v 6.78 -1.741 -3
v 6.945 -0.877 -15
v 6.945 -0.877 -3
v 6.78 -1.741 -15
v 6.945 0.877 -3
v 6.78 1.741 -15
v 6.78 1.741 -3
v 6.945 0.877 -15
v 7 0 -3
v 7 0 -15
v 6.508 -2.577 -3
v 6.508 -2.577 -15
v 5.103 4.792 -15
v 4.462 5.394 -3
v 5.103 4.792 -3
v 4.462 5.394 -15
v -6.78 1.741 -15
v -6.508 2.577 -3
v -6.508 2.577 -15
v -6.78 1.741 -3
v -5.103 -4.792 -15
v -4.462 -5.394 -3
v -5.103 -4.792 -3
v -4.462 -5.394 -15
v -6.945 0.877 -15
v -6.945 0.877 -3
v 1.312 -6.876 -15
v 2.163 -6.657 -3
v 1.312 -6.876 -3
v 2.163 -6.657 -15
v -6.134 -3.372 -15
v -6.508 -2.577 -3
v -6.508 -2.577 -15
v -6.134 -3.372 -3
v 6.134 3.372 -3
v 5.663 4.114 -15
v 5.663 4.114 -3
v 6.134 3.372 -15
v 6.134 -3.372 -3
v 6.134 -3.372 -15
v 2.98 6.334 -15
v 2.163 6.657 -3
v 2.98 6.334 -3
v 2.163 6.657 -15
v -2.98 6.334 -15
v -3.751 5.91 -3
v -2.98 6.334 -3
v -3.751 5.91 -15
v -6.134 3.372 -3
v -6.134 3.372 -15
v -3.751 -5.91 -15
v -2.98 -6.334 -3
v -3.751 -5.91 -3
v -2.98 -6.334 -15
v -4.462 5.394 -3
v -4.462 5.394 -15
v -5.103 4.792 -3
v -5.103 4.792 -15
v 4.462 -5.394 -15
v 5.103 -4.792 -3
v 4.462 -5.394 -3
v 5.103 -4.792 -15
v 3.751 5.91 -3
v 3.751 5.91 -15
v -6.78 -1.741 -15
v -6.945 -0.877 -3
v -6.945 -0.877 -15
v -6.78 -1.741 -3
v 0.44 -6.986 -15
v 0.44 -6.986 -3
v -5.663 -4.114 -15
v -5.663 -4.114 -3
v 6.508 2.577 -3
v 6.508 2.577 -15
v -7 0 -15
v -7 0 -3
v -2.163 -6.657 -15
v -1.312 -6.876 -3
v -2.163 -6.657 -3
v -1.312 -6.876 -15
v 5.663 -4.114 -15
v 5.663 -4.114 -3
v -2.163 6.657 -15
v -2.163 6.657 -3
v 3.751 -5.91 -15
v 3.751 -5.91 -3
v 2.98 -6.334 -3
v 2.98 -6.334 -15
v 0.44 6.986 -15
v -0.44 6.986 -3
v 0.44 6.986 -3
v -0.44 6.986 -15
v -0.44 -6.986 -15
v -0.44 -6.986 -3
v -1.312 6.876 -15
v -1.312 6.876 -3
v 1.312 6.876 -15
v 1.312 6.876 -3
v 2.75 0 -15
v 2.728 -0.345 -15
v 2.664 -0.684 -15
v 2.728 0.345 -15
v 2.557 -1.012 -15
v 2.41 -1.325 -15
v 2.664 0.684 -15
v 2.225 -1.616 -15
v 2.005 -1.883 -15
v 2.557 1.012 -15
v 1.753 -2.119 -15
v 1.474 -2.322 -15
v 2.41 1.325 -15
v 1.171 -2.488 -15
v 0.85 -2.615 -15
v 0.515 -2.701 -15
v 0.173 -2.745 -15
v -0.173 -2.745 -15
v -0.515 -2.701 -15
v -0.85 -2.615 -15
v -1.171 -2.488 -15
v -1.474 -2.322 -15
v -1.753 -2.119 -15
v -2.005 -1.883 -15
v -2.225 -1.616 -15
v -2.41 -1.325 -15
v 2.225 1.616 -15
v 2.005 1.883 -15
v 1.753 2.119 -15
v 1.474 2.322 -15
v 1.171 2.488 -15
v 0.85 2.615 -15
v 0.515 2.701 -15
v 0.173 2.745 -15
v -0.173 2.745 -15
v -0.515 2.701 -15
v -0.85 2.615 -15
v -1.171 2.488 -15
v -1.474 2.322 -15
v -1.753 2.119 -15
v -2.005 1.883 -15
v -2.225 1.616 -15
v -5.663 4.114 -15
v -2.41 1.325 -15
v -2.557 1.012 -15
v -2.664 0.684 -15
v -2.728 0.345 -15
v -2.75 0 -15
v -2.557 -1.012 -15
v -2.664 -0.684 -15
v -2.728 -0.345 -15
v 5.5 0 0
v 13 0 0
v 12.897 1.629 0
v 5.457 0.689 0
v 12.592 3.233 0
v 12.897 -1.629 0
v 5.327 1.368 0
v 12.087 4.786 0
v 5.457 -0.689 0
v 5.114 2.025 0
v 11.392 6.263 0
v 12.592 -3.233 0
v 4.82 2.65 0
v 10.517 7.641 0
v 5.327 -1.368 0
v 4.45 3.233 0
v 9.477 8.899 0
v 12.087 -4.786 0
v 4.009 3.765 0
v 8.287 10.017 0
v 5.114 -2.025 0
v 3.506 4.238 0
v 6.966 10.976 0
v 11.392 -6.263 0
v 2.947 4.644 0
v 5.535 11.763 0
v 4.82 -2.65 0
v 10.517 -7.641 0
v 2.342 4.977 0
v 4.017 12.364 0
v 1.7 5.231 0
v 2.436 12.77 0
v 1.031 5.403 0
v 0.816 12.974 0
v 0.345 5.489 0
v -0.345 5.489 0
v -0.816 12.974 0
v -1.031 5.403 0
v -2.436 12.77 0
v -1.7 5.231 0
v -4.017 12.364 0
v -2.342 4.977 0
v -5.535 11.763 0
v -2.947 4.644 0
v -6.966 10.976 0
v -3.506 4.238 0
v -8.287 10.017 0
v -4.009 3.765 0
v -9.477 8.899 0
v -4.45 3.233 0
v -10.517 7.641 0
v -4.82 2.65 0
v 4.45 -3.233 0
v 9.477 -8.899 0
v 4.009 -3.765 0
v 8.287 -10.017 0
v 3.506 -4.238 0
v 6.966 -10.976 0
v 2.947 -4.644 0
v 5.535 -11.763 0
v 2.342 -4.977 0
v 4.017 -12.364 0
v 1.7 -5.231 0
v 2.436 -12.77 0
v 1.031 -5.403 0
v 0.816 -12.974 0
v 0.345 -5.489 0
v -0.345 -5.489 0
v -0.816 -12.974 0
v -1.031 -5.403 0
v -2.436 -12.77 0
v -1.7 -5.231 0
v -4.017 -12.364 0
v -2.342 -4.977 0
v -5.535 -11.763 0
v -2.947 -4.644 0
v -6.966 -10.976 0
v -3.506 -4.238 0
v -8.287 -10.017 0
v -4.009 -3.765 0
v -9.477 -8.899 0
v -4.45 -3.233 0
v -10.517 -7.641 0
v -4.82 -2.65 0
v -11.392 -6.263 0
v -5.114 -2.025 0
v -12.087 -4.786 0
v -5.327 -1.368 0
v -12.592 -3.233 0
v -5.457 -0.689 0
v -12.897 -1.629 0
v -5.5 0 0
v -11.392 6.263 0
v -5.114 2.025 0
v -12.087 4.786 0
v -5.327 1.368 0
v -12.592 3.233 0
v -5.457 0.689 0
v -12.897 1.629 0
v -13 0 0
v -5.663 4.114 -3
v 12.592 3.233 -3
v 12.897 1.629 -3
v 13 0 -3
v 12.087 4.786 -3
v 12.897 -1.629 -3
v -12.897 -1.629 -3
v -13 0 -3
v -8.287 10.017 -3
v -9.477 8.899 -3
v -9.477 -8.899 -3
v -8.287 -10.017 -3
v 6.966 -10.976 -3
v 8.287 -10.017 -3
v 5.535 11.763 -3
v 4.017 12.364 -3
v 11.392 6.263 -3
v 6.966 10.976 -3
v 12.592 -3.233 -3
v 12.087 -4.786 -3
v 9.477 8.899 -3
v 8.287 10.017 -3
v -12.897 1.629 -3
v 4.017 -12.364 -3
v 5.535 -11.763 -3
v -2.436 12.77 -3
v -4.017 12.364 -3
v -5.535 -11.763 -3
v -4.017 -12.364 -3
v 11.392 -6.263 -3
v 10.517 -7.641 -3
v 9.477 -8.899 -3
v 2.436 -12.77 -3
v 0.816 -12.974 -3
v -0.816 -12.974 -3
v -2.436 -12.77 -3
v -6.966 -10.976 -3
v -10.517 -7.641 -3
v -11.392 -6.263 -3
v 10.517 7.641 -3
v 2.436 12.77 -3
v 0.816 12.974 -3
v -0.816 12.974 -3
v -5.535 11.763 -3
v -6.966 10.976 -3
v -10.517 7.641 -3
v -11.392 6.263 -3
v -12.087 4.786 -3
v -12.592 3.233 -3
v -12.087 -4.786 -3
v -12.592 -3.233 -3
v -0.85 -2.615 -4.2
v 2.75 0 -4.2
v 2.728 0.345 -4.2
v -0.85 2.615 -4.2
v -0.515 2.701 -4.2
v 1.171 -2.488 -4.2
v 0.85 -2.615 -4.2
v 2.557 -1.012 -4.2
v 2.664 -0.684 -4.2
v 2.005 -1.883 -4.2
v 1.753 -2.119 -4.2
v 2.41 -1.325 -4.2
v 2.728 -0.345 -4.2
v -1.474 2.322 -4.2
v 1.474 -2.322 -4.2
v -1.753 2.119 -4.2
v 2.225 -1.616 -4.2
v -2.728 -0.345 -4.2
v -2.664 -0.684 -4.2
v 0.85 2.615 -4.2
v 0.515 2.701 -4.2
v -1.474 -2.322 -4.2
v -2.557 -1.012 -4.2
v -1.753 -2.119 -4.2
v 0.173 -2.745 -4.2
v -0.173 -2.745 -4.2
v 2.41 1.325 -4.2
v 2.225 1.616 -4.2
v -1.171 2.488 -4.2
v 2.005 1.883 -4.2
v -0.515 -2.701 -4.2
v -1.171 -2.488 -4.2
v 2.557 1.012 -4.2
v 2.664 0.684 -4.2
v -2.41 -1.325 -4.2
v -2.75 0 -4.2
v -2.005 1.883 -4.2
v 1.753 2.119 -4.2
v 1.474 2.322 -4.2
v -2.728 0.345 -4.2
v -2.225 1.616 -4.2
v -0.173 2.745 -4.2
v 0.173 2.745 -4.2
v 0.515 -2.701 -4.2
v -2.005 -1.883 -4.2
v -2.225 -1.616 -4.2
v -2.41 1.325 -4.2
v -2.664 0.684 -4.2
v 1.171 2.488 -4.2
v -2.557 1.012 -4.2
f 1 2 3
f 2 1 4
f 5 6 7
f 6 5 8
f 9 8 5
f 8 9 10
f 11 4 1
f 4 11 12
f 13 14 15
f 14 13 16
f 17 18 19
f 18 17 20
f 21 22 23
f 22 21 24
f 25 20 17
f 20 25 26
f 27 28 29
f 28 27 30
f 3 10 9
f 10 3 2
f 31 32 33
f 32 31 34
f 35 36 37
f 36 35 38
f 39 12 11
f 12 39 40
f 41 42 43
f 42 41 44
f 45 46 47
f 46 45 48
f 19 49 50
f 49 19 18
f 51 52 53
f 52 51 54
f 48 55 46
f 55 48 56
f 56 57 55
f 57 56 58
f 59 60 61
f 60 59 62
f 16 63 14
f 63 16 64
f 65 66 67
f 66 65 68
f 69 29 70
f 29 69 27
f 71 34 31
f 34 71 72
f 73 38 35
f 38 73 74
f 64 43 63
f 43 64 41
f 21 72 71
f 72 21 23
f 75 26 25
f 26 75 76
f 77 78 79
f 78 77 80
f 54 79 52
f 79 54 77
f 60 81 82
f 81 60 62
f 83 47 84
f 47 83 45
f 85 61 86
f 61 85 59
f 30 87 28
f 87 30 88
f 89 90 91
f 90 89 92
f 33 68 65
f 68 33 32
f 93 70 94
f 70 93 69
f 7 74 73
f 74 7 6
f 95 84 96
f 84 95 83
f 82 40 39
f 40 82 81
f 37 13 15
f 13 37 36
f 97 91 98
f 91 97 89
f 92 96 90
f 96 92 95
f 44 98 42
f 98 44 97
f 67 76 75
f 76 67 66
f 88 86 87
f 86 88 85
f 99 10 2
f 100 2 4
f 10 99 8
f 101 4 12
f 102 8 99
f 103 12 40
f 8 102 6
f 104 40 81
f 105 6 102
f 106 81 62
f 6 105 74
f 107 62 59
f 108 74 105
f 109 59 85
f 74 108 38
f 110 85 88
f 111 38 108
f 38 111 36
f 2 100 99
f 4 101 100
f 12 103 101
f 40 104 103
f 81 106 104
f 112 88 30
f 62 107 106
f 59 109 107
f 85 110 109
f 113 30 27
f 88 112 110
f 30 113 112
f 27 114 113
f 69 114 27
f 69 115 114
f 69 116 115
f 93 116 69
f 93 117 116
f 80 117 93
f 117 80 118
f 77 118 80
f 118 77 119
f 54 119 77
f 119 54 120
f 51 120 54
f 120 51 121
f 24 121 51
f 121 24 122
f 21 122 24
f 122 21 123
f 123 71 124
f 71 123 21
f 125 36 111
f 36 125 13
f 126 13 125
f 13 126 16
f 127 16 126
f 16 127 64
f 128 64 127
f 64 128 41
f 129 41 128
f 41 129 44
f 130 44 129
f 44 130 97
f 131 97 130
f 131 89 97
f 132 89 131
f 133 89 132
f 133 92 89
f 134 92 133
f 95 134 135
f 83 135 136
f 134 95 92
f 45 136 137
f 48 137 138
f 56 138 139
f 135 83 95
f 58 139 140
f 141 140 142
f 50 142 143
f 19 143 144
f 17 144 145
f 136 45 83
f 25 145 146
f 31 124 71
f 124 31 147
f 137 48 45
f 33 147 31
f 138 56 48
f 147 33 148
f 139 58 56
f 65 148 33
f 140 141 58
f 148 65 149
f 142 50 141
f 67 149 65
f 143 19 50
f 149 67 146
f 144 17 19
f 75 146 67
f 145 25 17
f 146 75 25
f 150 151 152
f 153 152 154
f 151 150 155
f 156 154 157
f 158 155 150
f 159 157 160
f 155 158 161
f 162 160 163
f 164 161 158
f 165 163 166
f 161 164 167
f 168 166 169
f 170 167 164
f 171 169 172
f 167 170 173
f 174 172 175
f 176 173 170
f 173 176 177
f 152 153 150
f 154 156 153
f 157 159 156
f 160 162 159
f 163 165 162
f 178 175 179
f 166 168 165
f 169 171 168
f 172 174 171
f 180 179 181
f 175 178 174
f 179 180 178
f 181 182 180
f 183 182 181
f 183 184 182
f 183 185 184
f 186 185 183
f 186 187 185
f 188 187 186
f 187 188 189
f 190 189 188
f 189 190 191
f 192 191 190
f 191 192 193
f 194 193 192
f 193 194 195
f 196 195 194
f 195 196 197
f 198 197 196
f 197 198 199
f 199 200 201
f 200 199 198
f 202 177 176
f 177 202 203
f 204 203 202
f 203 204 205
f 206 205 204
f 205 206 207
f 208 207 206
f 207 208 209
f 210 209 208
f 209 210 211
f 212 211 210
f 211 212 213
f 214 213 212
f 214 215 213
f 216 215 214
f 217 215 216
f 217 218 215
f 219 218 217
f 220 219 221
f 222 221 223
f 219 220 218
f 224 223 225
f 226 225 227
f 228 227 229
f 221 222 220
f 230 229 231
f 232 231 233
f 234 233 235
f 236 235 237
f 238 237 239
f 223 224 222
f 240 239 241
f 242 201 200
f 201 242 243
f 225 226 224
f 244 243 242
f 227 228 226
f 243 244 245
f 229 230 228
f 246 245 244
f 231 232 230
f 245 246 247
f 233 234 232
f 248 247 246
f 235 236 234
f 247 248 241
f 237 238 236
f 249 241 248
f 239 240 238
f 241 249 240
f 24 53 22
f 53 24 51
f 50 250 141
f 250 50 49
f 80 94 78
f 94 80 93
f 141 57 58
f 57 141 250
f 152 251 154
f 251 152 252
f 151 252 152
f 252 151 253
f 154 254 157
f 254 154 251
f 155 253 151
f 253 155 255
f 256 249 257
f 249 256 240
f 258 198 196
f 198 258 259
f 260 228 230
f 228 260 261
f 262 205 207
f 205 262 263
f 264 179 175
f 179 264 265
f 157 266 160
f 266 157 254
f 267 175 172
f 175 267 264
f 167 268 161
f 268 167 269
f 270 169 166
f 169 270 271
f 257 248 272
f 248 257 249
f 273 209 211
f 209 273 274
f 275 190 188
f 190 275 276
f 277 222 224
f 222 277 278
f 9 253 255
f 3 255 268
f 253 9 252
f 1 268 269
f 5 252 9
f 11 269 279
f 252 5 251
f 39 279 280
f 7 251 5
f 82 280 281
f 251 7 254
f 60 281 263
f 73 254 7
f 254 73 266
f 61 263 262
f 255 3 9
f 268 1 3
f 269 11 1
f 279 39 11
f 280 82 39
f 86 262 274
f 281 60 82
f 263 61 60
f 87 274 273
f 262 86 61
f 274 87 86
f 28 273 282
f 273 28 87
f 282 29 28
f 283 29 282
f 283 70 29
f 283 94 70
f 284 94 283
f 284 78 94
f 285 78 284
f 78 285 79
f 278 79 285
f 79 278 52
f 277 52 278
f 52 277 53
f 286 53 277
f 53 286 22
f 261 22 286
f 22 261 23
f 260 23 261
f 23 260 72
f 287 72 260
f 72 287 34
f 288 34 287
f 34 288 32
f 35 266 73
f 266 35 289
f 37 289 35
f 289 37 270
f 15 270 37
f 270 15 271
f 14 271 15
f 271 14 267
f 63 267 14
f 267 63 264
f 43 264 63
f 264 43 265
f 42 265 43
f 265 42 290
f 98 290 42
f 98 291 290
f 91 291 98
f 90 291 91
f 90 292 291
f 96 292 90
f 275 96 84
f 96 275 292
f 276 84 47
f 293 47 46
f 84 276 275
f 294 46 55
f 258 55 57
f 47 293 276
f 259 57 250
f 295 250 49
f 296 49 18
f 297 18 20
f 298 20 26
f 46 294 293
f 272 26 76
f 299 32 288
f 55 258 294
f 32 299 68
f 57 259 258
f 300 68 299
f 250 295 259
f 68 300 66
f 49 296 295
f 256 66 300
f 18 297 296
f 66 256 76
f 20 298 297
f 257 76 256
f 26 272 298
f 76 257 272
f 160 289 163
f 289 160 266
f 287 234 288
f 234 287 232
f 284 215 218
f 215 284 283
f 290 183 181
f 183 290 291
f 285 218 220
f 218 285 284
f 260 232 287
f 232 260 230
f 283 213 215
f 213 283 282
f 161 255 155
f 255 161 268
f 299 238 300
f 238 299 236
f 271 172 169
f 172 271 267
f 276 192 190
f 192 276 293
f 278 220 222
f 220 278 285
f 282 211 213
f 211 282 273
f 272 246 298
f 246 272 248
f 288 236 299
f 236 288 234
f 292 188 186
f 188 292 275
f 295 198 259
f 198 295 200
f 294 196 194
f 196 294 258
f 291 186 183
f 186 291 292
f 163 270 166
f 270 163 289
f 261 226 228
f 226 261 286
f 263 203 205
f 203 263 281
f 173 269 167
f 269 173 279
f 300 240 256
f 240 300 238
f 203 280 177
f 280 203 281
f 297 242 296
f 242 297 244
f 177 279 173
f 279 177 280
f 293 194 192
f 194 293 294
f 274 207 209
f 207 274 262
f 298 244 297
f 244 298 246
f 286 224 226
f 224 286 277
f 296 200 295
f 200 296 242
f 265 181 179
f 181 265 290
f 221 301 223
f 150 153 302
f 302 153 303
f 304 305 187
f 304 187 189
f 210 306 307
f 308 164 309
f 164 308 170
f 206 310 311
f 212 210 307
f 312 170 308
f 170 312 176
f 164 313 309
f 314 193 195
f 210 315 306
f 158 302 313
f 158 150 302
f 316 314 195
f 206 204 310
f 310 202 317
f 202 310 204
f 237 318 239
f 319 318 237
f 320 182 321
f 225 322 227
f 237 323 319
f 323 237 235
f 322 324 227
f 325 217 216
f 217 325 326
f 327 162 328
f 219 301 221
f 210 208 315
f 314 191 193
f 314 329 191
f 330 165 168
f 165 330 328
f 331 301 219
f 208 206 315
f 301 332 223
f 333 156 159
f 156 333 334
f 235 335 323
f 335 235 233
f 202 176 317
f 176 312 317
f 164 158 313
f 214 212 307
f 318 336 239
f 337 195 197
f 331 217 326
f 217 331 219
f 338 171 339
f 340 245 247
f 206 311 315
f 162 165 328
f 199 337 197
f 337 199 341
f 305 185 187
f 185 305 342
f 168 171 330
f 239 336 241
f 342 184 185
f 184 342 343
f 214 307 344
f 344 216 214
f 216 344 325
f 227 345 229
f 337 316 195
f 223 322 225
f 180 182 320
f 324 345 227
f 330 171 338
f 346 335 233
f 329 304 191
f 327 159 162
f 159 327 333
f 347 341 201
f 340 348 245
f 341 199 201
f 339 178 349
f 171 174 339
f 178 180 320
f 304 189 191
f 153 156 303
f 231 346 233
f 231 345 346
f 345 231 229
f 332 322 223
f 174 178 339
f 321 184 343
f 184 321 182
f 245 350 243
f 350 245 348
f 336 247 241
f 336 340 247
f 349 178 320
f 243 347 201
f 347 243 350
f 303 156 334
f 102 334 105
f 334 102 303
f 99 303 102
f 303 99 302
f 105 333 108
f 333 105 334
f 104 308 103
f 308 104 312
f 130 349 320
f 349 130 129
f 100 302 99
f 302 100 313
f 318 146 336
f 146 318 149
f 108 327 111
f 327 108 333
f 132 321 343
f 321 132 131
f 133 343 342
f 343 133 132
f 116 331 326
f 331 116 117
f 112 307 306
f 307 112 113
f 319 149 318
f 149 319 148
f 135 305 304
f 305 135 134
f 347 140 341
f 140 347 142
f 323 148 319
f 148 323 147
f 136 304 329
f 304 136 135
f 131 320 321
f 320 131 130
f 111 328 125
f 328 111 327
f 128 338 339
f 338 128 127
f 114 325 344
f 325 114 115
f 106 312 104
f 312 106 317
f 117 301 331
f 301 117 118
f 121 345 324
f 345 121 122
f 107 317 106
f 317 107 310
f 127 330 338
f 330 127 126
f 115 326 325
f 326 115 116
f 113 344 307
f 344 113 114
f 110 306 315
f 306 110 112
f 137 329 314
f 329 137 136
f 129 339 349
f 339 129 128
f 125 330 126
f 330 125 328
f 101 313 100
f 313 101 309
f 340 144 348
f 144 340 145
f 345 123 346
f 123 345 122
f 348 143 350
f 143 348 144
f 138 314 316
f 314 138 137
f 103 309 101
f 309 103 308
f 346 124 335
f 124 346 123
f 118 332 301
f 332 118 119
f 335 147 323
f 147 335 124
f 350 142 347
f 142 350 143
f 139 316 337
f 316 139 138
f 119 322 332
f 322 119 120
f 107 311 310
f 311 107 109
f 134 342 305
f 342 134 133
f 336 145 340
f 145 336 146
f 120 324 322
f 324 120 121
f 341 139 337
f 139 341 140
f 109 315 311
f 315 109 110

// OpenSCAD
$fn = 50;


difference() {
	union() {
		translate(v = [0, 0, -15.0000000000]) {
			cylinder(h = 15, r = 7.0000000000);
		}
		translate(v = [0, 0, -3.0000000000]) {
			cylinder(h = 3, r = 13.0000000000);
		}
	}
	union() {
		translate(v = [0, 0, 0]) {
			rotate(a = [0, 0, 0]) {
				difference() {
					union() {
						#translate(v = [0, 0, -15.0000000000]) {
							cylinder(h = 15, r = 2.2500000000);
						}
						#translate(v = [0, 0, -4.2000000000]) {
							cylinder(h = 4.2000000000, r = 7.0000000000, r1 = 2.7500000000, r2 = 5.5000000000);
						}
						#translate(v = [0, 0, -15.0000000000]) {
							cylinder(h = 15, r = 2.7500000000);
						}
						#translate(v = [0, 0, -15.0000000000]) {
							cylinder(h = 15, r = 2.2500000000);
						}
					}
					union();
				}
			}
		}
	}
}
